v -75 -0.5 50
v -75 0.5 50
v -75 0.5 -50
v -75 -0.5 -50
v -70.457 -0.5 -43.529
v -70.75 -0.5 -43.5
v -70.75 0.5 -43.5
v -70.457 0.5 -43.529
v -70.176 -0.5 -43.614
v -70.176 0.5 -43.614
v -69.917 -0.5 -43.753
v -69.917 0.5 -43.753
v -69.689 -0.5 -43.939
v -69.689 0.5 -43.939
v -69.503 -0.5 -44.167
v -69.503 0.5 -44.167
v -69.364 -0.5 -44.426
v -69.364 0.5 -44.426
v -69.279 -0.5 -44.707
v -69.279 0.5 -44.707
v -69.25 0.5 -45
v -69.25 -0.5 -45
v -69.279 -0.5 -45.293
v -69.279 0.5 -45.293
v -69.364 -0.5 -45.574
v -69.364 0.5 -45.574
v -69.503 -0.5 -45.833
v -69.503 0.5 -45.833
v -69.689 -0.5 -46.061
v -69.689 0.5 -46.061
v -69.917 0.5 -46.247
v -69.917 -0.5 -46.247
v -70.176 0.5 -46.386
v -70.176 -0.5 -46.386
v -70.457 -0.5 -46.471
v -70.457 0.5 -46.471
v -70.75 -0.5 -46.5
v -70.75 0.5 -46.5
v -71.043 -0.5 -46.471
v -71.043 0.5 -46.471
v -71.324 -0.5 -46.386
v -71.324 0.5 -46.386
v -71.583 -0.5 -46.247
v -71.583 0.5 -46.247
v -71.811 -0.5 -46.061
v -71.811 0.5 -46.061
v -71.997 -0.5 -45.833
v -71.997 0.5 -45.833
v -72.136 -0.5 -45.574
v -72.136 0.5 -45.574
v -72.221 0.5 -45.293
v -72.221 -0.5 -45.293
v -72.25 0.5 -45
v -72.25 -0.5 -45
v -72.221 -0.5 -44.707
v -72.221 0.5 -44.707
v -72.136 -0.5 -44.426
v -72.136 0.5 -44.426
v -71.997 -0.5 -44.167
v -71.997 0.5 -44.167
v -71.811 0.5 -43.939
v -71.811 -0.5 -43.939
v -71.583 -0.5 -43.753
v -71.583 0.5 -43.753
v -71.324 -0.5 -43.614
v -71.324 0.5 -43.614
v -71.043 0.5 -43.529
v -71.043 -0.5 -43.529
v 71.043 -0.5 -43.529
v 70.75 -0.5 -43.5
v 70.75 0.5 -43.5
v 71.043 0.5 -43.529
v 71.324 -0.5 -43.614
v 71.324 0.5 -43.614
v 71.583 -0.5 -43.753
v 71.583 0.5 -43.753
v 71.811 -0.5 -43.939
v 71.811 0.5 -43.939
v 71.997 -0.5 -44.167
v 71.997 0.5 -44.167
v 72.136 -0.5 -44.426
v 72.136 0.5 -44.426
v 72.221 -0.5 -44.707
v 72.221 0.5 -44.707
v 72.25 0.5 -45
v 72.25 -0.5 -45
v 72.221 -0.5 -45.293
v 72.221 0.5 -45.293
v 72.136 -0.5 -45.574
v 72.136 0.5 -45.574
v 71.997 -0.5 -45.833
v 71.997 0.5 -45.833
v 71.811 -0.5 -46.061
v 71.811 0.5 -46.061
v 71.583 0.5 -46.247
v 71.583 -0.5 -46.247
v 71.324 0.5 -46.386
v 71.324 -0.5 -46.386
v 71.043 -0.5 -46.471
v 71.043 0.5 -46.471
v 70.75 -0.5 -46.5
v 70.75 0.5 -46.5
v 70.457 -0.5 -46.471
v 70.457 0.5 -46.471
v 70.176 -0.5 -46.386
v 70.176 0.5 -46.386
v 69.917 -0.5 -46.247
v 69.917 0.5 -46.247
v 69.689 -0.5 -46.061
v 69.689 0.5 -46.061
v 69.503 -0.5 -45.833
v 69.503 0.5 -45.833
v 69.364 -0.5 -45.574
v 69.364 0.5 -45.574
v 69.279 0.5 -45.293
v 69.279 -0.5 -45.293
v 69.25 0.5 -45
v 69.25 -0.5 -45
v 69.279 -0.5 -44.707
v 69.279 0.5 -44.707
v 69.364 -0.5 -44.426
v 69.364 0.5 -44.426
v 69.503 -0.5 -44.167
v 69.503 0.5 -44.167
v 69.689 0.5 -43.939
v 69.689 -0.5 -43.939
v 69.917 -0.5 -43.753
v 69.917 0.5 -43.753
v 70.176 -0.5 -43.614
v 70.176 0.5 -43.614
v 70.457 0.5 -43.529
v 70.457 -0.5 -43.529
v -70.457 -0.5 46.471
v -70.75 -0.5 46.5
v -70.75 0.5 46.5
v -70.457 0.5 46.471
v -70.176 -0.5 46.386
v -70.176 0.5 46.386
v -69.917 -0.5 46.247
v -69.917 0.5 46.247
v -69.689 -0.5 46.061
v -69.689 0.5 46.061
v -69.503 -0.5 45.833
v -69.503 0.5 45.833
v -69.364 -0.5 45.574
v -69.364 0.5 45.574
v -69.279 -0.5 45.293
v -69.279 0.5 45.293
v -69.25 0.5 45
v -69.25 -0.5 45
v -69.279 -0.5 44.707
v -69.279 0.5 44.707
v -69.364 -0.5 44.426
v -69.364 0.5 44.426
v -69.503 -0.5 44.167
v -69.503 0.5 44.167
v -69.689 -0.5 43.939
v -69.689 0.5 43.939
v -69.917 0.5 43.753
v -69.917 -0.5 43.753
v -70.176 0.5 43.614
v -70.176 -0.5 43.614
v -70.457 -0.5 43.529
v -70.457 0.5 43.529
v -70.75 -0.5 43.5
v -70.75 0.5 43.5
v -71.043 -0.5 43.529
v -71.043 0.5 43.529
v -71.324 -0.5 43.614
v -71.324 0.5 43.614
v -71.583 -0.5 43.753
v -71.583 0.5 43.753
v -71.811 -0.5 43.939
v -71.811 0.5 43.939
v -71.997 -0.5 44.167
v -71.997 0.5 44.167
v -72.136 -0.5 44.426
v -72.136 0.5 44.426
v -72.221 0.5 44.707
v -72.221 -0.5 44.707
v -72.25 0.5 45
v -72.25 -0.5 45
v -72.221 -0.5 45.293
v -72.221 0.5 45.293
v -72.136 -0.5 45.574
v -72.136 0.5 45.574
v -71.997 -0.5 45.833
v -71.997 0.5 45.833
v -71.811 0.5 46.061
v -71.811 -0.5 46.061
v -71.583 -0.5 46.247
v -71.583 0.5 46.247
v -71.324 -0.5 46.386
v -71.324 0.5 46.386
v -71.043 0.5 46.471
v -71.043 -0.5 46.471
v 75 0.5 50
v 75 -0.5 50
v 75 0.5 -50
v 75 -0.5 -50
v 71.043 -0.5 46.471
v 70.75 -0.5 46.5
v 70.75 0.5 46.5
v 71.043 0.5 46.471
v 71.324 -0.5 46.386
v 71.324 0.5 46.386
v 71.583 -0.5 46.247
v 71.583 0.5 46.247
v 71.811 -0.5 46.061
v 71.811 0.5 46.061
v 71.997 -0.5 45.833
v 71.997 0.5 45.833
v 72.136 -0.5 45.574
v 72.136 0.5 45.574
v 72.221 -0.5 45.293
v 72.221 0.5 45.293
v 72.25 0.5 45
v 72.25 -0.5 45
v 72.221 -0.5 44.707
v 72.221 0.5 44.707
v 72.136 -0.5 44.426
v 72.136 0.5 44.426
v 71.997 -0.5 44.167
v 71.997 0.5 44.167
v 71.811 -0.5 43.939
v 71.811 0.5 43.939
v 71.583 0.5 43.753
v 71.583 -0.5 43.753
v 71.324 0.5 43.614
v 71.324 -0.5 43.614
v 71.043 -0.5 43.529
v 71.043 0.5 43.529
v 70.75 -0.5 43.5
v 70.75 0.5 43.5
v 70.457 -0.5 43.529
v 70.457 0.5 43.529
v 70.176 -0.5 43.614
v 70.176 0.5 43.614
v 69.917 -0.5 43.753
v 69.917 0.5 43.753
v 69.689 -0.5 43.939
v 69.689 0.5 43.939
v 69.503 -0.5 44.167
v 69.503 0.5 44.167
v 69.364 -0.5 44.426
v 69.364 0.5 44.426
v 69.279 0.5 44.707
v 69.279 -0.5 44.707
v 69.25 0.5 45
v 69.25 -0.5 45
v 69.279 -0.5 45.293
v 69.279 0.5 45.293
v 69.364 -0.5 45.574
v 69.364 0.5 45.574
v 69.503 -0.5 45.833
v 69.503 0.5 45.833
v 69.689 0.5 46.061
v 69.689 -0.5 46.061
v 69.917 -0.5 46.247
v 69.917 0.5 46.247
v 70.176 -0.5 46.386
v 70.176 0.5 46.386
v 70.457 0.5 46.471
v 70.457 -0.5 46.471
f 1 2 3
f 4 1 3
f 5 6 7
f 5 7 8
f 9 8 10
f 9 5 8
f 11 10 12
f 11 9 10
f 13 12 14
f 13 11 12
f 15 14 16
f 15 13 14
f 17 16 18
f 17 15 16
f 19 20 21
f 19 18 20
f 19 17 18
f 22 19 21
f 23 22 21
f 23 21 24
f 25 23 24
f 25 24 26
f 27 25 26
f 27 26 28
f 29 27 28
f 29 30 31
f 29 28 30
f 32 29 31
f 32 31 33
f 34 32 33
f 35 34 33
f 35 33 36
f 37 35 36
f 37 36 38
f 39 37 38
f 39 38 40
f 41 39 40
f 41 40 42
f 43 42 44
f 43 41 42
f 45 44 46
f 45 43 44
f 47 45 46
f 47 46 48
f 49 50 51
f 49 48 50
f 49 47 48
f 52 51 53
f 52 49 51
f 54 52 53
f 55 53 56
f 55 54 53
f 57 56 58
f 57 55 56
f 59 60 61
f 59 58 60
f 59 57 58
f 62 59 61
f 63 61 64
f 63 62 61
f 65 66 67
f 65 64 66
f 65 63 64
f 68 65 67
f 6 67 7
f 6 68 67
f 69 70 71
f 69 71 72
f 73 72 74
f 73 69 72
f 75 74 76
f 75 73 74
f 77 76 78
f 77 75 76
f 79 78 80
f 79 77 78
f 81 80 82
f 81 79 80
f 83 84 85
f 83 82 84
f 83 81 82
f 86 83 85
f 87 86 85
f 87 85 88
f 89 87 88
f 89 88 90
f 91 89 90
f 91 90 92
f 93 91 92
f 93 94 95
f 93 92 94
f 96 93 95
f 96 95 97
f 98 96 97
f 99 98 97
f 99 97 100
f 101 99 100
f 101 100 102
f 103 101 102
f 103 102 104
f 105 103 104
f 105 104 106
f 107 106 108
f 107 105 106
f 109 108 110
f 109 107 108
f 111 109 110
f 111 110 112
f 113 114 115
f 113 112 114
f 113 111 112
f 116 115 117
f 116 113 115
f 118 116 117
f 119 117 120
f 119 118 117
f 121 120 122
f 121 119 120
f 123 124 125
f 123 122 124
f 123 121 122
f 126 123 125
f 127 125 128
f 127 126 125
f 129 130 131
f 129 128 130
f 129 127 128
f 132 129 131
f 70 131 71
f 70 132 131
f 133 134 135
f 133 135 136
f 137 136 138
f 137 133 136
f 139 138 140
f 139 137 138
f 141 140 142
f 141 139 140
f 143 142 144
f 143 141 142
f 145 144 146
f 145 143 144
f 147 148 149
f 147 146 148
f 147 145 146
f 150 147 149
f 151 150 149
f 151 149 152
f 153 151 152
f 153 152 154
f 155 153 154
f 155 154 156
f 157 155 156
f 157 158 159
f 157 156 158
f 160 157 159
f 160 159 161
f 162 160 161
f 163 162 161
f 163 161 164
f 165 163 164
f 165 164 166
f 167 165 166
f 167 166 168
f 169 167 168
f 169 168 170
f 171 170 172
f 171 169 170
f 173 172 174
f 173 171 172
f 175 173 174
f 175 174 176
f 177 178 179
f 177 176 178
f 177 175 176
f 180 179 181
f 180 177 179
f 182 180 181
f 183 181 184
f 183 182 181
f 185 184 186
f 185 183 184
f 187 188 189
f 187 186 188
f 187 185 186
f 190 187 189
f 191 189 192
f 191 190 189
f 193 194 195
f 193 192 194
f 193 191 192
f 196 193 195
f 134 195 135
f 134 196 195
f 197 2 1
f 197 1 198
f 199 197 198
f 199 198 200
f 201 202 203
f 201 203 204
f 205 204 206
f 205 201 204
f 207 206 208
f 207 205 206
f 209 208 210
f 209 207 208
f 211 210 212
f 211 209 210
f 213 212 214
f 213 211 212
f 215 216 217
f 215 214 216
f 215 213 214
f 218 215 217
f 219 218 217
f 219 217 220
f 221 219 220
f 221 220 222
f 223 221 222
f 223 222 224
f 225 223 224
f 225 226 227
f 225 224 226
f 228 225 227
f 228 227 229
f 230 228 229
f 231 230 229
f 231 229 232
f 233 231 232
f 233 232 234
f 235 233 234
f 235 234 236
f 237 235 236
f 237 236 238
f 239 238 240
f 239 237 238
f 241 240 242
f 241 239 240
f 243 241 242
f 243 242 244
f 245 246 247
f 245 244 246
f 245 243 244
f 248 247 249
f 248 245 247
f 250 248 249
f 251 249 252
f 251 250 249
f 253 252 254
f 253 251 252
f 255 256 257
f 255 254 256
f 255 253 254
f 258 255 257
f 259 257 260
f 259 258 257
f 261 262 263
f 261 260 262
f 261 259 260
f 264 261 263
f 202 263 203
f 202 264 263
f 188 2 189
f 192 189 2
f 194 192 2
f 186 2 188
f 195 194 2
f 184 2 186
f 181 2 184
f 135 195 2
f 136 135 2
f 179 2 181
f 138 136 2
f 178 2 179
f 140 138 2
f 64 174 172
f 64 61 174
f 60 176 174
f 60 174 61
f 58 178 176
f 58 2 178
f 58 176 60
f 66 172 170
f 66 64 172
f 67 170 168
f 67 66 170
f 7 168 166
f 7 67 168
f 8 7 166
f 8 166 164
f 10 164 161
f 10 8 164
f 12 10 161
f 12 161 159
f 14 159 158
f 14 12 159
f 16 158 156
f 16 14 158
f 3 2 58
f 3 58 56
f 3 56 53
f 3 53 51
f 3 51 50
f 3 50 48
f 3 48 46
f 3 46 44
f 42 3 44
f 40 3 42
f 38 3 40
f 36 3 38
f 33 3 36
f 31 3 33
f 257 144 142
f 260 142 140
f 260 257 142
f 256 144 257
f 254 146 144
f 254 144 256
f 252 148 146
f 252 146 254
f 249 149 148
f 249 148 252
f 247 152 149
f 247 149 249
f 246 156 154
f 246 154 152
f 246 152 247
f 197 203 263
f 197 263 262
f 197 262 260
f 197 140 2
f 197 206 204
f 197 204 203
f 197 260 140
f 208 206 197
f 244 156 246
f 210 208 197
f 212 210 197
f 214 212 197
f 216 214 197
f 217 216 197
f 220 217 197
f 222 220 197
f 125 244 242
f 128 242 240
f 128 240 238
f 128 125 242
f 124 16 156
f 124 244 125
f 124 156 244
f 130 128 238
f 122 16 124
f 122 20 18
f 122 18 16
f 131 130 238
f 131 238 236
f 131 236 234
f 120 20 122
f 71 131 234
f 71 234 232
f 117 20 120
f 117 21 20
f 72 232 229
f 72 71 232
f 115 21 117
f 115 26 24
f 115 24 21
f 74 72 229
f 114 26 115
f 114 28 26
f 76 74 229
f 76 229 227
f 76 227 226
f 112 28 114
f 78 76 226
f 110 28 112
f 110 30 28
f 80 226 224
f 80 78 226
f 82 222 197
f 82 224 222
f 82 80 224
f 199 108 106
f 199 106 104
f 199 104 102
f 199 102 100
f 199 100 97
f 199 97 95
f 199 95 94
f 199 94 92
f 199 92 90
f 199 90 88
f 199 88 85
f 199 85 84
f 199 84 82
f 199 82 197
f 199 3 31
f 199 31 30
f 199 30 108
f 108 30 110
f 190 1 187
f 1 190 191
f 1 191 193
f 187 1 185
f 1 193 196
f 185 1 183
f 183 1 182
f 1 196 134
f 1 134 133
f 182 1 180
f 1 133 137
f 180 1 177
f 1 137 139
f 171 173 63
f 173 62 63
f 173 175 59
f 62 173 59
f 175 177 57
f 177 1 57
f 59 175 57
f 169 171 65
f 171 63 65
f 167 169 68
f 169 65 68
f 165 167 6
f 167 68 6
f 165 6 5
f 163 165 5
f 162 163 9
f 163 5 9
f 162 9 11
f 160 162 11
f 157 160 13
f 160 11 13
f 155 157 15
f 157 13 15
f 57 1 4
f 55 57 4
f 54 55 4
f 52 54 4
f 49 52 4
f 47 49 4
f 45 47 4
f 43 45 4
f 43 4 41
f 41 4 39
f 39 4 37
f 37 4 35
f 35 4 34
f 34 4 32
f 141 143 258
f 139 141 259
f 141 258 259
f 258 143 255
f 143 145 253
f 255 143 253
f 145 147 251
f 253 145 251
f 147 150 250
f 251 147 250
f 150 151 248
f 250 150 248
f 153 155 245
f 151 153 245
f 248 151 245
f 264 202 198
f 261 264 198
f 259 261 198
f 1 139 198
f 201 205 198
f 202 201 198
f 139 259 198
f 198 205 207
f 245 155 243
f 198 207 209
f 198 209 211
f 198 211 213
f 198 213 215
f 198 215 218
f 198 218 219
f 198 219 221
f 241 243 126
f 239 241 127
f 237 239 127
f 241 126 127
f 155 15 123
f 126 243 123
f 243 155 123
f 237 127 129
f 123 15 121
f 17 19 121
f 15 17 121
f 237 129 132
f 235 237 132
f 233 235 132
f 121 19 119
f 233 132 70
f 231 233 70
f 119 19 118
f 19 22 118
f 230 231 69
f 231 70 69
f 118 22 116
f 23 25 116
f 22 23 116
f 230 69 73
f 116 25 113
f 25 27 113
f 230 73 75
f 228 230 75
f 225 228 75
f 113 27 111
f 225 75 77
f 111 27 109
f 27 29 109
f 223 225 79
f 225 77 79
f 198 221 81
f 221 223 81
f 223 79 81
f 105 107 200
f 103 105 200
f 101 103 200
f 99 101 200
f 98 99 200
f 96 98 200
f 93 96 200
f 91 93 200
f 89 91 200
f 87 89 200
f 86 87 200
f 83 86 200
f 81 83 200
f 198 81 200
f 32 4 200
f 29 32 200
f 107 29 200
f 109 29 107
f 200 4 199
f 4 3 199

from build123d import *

# Parameters (mm, degrees)
SKETCH_1_W               = 150
SKETCH_1_H               = 100
EXTRUDE_1_DEPTH          = 0.5
CUT_EXTRUDE_1_DEPTH      = 91.140168626
CUT_EXTRUDE_1_DEPTH_BACK = 91.140168626
SKETCH_2_R               = 1.5


with BuildPart() as part:
    # 草图1 → 凸台-拉伸1 (new, symmetric)
    with BuildSketch(Plane(origin=(0, 0, 0), x_dir=(1, 0, 0), z_dir=(0, 1, 0))):
        Rectangle(SKETCH_1_W, SKETCH_1_H)
    extrude(amount=EXTRUDE_1_DEPTH, both=True)

    # 草图2 → 切除-拉伸1 (cut, two sides: drawn at the far end of the back side and taken through both)
    with BuildSketch(Plane(origin=(0, 0, 0), x_dir=(1, 0, 0), z_dir=(0, 1, 0)).offset(-CUT_EXTRUDE_1_DEPTH_BACK)):
        with Locations(Location((-70.75, 45, 0), (0, 0, 270))):
            Circle(SKETCH_2_R)
        with Locations(Location((70.75, 45, 0), (0, 0, 270))):
            Circle(SKETCH_2_R)
        with Locations(Location((-70.75, -45, 0), (0, 0, 270))):
            Circle(SKETCH_2_R)
        with Locations(Location((70.75, -45, 0), (0, 0, 270))):
            Circle(SKETCH_2_R)
    extrude(amount=CUT_EXTRUDE_1_DEPTH + CUT_EXTRUDE_1_DEPTH_BACK, mode=Mode.SUBTRACT)


solid = part.part
